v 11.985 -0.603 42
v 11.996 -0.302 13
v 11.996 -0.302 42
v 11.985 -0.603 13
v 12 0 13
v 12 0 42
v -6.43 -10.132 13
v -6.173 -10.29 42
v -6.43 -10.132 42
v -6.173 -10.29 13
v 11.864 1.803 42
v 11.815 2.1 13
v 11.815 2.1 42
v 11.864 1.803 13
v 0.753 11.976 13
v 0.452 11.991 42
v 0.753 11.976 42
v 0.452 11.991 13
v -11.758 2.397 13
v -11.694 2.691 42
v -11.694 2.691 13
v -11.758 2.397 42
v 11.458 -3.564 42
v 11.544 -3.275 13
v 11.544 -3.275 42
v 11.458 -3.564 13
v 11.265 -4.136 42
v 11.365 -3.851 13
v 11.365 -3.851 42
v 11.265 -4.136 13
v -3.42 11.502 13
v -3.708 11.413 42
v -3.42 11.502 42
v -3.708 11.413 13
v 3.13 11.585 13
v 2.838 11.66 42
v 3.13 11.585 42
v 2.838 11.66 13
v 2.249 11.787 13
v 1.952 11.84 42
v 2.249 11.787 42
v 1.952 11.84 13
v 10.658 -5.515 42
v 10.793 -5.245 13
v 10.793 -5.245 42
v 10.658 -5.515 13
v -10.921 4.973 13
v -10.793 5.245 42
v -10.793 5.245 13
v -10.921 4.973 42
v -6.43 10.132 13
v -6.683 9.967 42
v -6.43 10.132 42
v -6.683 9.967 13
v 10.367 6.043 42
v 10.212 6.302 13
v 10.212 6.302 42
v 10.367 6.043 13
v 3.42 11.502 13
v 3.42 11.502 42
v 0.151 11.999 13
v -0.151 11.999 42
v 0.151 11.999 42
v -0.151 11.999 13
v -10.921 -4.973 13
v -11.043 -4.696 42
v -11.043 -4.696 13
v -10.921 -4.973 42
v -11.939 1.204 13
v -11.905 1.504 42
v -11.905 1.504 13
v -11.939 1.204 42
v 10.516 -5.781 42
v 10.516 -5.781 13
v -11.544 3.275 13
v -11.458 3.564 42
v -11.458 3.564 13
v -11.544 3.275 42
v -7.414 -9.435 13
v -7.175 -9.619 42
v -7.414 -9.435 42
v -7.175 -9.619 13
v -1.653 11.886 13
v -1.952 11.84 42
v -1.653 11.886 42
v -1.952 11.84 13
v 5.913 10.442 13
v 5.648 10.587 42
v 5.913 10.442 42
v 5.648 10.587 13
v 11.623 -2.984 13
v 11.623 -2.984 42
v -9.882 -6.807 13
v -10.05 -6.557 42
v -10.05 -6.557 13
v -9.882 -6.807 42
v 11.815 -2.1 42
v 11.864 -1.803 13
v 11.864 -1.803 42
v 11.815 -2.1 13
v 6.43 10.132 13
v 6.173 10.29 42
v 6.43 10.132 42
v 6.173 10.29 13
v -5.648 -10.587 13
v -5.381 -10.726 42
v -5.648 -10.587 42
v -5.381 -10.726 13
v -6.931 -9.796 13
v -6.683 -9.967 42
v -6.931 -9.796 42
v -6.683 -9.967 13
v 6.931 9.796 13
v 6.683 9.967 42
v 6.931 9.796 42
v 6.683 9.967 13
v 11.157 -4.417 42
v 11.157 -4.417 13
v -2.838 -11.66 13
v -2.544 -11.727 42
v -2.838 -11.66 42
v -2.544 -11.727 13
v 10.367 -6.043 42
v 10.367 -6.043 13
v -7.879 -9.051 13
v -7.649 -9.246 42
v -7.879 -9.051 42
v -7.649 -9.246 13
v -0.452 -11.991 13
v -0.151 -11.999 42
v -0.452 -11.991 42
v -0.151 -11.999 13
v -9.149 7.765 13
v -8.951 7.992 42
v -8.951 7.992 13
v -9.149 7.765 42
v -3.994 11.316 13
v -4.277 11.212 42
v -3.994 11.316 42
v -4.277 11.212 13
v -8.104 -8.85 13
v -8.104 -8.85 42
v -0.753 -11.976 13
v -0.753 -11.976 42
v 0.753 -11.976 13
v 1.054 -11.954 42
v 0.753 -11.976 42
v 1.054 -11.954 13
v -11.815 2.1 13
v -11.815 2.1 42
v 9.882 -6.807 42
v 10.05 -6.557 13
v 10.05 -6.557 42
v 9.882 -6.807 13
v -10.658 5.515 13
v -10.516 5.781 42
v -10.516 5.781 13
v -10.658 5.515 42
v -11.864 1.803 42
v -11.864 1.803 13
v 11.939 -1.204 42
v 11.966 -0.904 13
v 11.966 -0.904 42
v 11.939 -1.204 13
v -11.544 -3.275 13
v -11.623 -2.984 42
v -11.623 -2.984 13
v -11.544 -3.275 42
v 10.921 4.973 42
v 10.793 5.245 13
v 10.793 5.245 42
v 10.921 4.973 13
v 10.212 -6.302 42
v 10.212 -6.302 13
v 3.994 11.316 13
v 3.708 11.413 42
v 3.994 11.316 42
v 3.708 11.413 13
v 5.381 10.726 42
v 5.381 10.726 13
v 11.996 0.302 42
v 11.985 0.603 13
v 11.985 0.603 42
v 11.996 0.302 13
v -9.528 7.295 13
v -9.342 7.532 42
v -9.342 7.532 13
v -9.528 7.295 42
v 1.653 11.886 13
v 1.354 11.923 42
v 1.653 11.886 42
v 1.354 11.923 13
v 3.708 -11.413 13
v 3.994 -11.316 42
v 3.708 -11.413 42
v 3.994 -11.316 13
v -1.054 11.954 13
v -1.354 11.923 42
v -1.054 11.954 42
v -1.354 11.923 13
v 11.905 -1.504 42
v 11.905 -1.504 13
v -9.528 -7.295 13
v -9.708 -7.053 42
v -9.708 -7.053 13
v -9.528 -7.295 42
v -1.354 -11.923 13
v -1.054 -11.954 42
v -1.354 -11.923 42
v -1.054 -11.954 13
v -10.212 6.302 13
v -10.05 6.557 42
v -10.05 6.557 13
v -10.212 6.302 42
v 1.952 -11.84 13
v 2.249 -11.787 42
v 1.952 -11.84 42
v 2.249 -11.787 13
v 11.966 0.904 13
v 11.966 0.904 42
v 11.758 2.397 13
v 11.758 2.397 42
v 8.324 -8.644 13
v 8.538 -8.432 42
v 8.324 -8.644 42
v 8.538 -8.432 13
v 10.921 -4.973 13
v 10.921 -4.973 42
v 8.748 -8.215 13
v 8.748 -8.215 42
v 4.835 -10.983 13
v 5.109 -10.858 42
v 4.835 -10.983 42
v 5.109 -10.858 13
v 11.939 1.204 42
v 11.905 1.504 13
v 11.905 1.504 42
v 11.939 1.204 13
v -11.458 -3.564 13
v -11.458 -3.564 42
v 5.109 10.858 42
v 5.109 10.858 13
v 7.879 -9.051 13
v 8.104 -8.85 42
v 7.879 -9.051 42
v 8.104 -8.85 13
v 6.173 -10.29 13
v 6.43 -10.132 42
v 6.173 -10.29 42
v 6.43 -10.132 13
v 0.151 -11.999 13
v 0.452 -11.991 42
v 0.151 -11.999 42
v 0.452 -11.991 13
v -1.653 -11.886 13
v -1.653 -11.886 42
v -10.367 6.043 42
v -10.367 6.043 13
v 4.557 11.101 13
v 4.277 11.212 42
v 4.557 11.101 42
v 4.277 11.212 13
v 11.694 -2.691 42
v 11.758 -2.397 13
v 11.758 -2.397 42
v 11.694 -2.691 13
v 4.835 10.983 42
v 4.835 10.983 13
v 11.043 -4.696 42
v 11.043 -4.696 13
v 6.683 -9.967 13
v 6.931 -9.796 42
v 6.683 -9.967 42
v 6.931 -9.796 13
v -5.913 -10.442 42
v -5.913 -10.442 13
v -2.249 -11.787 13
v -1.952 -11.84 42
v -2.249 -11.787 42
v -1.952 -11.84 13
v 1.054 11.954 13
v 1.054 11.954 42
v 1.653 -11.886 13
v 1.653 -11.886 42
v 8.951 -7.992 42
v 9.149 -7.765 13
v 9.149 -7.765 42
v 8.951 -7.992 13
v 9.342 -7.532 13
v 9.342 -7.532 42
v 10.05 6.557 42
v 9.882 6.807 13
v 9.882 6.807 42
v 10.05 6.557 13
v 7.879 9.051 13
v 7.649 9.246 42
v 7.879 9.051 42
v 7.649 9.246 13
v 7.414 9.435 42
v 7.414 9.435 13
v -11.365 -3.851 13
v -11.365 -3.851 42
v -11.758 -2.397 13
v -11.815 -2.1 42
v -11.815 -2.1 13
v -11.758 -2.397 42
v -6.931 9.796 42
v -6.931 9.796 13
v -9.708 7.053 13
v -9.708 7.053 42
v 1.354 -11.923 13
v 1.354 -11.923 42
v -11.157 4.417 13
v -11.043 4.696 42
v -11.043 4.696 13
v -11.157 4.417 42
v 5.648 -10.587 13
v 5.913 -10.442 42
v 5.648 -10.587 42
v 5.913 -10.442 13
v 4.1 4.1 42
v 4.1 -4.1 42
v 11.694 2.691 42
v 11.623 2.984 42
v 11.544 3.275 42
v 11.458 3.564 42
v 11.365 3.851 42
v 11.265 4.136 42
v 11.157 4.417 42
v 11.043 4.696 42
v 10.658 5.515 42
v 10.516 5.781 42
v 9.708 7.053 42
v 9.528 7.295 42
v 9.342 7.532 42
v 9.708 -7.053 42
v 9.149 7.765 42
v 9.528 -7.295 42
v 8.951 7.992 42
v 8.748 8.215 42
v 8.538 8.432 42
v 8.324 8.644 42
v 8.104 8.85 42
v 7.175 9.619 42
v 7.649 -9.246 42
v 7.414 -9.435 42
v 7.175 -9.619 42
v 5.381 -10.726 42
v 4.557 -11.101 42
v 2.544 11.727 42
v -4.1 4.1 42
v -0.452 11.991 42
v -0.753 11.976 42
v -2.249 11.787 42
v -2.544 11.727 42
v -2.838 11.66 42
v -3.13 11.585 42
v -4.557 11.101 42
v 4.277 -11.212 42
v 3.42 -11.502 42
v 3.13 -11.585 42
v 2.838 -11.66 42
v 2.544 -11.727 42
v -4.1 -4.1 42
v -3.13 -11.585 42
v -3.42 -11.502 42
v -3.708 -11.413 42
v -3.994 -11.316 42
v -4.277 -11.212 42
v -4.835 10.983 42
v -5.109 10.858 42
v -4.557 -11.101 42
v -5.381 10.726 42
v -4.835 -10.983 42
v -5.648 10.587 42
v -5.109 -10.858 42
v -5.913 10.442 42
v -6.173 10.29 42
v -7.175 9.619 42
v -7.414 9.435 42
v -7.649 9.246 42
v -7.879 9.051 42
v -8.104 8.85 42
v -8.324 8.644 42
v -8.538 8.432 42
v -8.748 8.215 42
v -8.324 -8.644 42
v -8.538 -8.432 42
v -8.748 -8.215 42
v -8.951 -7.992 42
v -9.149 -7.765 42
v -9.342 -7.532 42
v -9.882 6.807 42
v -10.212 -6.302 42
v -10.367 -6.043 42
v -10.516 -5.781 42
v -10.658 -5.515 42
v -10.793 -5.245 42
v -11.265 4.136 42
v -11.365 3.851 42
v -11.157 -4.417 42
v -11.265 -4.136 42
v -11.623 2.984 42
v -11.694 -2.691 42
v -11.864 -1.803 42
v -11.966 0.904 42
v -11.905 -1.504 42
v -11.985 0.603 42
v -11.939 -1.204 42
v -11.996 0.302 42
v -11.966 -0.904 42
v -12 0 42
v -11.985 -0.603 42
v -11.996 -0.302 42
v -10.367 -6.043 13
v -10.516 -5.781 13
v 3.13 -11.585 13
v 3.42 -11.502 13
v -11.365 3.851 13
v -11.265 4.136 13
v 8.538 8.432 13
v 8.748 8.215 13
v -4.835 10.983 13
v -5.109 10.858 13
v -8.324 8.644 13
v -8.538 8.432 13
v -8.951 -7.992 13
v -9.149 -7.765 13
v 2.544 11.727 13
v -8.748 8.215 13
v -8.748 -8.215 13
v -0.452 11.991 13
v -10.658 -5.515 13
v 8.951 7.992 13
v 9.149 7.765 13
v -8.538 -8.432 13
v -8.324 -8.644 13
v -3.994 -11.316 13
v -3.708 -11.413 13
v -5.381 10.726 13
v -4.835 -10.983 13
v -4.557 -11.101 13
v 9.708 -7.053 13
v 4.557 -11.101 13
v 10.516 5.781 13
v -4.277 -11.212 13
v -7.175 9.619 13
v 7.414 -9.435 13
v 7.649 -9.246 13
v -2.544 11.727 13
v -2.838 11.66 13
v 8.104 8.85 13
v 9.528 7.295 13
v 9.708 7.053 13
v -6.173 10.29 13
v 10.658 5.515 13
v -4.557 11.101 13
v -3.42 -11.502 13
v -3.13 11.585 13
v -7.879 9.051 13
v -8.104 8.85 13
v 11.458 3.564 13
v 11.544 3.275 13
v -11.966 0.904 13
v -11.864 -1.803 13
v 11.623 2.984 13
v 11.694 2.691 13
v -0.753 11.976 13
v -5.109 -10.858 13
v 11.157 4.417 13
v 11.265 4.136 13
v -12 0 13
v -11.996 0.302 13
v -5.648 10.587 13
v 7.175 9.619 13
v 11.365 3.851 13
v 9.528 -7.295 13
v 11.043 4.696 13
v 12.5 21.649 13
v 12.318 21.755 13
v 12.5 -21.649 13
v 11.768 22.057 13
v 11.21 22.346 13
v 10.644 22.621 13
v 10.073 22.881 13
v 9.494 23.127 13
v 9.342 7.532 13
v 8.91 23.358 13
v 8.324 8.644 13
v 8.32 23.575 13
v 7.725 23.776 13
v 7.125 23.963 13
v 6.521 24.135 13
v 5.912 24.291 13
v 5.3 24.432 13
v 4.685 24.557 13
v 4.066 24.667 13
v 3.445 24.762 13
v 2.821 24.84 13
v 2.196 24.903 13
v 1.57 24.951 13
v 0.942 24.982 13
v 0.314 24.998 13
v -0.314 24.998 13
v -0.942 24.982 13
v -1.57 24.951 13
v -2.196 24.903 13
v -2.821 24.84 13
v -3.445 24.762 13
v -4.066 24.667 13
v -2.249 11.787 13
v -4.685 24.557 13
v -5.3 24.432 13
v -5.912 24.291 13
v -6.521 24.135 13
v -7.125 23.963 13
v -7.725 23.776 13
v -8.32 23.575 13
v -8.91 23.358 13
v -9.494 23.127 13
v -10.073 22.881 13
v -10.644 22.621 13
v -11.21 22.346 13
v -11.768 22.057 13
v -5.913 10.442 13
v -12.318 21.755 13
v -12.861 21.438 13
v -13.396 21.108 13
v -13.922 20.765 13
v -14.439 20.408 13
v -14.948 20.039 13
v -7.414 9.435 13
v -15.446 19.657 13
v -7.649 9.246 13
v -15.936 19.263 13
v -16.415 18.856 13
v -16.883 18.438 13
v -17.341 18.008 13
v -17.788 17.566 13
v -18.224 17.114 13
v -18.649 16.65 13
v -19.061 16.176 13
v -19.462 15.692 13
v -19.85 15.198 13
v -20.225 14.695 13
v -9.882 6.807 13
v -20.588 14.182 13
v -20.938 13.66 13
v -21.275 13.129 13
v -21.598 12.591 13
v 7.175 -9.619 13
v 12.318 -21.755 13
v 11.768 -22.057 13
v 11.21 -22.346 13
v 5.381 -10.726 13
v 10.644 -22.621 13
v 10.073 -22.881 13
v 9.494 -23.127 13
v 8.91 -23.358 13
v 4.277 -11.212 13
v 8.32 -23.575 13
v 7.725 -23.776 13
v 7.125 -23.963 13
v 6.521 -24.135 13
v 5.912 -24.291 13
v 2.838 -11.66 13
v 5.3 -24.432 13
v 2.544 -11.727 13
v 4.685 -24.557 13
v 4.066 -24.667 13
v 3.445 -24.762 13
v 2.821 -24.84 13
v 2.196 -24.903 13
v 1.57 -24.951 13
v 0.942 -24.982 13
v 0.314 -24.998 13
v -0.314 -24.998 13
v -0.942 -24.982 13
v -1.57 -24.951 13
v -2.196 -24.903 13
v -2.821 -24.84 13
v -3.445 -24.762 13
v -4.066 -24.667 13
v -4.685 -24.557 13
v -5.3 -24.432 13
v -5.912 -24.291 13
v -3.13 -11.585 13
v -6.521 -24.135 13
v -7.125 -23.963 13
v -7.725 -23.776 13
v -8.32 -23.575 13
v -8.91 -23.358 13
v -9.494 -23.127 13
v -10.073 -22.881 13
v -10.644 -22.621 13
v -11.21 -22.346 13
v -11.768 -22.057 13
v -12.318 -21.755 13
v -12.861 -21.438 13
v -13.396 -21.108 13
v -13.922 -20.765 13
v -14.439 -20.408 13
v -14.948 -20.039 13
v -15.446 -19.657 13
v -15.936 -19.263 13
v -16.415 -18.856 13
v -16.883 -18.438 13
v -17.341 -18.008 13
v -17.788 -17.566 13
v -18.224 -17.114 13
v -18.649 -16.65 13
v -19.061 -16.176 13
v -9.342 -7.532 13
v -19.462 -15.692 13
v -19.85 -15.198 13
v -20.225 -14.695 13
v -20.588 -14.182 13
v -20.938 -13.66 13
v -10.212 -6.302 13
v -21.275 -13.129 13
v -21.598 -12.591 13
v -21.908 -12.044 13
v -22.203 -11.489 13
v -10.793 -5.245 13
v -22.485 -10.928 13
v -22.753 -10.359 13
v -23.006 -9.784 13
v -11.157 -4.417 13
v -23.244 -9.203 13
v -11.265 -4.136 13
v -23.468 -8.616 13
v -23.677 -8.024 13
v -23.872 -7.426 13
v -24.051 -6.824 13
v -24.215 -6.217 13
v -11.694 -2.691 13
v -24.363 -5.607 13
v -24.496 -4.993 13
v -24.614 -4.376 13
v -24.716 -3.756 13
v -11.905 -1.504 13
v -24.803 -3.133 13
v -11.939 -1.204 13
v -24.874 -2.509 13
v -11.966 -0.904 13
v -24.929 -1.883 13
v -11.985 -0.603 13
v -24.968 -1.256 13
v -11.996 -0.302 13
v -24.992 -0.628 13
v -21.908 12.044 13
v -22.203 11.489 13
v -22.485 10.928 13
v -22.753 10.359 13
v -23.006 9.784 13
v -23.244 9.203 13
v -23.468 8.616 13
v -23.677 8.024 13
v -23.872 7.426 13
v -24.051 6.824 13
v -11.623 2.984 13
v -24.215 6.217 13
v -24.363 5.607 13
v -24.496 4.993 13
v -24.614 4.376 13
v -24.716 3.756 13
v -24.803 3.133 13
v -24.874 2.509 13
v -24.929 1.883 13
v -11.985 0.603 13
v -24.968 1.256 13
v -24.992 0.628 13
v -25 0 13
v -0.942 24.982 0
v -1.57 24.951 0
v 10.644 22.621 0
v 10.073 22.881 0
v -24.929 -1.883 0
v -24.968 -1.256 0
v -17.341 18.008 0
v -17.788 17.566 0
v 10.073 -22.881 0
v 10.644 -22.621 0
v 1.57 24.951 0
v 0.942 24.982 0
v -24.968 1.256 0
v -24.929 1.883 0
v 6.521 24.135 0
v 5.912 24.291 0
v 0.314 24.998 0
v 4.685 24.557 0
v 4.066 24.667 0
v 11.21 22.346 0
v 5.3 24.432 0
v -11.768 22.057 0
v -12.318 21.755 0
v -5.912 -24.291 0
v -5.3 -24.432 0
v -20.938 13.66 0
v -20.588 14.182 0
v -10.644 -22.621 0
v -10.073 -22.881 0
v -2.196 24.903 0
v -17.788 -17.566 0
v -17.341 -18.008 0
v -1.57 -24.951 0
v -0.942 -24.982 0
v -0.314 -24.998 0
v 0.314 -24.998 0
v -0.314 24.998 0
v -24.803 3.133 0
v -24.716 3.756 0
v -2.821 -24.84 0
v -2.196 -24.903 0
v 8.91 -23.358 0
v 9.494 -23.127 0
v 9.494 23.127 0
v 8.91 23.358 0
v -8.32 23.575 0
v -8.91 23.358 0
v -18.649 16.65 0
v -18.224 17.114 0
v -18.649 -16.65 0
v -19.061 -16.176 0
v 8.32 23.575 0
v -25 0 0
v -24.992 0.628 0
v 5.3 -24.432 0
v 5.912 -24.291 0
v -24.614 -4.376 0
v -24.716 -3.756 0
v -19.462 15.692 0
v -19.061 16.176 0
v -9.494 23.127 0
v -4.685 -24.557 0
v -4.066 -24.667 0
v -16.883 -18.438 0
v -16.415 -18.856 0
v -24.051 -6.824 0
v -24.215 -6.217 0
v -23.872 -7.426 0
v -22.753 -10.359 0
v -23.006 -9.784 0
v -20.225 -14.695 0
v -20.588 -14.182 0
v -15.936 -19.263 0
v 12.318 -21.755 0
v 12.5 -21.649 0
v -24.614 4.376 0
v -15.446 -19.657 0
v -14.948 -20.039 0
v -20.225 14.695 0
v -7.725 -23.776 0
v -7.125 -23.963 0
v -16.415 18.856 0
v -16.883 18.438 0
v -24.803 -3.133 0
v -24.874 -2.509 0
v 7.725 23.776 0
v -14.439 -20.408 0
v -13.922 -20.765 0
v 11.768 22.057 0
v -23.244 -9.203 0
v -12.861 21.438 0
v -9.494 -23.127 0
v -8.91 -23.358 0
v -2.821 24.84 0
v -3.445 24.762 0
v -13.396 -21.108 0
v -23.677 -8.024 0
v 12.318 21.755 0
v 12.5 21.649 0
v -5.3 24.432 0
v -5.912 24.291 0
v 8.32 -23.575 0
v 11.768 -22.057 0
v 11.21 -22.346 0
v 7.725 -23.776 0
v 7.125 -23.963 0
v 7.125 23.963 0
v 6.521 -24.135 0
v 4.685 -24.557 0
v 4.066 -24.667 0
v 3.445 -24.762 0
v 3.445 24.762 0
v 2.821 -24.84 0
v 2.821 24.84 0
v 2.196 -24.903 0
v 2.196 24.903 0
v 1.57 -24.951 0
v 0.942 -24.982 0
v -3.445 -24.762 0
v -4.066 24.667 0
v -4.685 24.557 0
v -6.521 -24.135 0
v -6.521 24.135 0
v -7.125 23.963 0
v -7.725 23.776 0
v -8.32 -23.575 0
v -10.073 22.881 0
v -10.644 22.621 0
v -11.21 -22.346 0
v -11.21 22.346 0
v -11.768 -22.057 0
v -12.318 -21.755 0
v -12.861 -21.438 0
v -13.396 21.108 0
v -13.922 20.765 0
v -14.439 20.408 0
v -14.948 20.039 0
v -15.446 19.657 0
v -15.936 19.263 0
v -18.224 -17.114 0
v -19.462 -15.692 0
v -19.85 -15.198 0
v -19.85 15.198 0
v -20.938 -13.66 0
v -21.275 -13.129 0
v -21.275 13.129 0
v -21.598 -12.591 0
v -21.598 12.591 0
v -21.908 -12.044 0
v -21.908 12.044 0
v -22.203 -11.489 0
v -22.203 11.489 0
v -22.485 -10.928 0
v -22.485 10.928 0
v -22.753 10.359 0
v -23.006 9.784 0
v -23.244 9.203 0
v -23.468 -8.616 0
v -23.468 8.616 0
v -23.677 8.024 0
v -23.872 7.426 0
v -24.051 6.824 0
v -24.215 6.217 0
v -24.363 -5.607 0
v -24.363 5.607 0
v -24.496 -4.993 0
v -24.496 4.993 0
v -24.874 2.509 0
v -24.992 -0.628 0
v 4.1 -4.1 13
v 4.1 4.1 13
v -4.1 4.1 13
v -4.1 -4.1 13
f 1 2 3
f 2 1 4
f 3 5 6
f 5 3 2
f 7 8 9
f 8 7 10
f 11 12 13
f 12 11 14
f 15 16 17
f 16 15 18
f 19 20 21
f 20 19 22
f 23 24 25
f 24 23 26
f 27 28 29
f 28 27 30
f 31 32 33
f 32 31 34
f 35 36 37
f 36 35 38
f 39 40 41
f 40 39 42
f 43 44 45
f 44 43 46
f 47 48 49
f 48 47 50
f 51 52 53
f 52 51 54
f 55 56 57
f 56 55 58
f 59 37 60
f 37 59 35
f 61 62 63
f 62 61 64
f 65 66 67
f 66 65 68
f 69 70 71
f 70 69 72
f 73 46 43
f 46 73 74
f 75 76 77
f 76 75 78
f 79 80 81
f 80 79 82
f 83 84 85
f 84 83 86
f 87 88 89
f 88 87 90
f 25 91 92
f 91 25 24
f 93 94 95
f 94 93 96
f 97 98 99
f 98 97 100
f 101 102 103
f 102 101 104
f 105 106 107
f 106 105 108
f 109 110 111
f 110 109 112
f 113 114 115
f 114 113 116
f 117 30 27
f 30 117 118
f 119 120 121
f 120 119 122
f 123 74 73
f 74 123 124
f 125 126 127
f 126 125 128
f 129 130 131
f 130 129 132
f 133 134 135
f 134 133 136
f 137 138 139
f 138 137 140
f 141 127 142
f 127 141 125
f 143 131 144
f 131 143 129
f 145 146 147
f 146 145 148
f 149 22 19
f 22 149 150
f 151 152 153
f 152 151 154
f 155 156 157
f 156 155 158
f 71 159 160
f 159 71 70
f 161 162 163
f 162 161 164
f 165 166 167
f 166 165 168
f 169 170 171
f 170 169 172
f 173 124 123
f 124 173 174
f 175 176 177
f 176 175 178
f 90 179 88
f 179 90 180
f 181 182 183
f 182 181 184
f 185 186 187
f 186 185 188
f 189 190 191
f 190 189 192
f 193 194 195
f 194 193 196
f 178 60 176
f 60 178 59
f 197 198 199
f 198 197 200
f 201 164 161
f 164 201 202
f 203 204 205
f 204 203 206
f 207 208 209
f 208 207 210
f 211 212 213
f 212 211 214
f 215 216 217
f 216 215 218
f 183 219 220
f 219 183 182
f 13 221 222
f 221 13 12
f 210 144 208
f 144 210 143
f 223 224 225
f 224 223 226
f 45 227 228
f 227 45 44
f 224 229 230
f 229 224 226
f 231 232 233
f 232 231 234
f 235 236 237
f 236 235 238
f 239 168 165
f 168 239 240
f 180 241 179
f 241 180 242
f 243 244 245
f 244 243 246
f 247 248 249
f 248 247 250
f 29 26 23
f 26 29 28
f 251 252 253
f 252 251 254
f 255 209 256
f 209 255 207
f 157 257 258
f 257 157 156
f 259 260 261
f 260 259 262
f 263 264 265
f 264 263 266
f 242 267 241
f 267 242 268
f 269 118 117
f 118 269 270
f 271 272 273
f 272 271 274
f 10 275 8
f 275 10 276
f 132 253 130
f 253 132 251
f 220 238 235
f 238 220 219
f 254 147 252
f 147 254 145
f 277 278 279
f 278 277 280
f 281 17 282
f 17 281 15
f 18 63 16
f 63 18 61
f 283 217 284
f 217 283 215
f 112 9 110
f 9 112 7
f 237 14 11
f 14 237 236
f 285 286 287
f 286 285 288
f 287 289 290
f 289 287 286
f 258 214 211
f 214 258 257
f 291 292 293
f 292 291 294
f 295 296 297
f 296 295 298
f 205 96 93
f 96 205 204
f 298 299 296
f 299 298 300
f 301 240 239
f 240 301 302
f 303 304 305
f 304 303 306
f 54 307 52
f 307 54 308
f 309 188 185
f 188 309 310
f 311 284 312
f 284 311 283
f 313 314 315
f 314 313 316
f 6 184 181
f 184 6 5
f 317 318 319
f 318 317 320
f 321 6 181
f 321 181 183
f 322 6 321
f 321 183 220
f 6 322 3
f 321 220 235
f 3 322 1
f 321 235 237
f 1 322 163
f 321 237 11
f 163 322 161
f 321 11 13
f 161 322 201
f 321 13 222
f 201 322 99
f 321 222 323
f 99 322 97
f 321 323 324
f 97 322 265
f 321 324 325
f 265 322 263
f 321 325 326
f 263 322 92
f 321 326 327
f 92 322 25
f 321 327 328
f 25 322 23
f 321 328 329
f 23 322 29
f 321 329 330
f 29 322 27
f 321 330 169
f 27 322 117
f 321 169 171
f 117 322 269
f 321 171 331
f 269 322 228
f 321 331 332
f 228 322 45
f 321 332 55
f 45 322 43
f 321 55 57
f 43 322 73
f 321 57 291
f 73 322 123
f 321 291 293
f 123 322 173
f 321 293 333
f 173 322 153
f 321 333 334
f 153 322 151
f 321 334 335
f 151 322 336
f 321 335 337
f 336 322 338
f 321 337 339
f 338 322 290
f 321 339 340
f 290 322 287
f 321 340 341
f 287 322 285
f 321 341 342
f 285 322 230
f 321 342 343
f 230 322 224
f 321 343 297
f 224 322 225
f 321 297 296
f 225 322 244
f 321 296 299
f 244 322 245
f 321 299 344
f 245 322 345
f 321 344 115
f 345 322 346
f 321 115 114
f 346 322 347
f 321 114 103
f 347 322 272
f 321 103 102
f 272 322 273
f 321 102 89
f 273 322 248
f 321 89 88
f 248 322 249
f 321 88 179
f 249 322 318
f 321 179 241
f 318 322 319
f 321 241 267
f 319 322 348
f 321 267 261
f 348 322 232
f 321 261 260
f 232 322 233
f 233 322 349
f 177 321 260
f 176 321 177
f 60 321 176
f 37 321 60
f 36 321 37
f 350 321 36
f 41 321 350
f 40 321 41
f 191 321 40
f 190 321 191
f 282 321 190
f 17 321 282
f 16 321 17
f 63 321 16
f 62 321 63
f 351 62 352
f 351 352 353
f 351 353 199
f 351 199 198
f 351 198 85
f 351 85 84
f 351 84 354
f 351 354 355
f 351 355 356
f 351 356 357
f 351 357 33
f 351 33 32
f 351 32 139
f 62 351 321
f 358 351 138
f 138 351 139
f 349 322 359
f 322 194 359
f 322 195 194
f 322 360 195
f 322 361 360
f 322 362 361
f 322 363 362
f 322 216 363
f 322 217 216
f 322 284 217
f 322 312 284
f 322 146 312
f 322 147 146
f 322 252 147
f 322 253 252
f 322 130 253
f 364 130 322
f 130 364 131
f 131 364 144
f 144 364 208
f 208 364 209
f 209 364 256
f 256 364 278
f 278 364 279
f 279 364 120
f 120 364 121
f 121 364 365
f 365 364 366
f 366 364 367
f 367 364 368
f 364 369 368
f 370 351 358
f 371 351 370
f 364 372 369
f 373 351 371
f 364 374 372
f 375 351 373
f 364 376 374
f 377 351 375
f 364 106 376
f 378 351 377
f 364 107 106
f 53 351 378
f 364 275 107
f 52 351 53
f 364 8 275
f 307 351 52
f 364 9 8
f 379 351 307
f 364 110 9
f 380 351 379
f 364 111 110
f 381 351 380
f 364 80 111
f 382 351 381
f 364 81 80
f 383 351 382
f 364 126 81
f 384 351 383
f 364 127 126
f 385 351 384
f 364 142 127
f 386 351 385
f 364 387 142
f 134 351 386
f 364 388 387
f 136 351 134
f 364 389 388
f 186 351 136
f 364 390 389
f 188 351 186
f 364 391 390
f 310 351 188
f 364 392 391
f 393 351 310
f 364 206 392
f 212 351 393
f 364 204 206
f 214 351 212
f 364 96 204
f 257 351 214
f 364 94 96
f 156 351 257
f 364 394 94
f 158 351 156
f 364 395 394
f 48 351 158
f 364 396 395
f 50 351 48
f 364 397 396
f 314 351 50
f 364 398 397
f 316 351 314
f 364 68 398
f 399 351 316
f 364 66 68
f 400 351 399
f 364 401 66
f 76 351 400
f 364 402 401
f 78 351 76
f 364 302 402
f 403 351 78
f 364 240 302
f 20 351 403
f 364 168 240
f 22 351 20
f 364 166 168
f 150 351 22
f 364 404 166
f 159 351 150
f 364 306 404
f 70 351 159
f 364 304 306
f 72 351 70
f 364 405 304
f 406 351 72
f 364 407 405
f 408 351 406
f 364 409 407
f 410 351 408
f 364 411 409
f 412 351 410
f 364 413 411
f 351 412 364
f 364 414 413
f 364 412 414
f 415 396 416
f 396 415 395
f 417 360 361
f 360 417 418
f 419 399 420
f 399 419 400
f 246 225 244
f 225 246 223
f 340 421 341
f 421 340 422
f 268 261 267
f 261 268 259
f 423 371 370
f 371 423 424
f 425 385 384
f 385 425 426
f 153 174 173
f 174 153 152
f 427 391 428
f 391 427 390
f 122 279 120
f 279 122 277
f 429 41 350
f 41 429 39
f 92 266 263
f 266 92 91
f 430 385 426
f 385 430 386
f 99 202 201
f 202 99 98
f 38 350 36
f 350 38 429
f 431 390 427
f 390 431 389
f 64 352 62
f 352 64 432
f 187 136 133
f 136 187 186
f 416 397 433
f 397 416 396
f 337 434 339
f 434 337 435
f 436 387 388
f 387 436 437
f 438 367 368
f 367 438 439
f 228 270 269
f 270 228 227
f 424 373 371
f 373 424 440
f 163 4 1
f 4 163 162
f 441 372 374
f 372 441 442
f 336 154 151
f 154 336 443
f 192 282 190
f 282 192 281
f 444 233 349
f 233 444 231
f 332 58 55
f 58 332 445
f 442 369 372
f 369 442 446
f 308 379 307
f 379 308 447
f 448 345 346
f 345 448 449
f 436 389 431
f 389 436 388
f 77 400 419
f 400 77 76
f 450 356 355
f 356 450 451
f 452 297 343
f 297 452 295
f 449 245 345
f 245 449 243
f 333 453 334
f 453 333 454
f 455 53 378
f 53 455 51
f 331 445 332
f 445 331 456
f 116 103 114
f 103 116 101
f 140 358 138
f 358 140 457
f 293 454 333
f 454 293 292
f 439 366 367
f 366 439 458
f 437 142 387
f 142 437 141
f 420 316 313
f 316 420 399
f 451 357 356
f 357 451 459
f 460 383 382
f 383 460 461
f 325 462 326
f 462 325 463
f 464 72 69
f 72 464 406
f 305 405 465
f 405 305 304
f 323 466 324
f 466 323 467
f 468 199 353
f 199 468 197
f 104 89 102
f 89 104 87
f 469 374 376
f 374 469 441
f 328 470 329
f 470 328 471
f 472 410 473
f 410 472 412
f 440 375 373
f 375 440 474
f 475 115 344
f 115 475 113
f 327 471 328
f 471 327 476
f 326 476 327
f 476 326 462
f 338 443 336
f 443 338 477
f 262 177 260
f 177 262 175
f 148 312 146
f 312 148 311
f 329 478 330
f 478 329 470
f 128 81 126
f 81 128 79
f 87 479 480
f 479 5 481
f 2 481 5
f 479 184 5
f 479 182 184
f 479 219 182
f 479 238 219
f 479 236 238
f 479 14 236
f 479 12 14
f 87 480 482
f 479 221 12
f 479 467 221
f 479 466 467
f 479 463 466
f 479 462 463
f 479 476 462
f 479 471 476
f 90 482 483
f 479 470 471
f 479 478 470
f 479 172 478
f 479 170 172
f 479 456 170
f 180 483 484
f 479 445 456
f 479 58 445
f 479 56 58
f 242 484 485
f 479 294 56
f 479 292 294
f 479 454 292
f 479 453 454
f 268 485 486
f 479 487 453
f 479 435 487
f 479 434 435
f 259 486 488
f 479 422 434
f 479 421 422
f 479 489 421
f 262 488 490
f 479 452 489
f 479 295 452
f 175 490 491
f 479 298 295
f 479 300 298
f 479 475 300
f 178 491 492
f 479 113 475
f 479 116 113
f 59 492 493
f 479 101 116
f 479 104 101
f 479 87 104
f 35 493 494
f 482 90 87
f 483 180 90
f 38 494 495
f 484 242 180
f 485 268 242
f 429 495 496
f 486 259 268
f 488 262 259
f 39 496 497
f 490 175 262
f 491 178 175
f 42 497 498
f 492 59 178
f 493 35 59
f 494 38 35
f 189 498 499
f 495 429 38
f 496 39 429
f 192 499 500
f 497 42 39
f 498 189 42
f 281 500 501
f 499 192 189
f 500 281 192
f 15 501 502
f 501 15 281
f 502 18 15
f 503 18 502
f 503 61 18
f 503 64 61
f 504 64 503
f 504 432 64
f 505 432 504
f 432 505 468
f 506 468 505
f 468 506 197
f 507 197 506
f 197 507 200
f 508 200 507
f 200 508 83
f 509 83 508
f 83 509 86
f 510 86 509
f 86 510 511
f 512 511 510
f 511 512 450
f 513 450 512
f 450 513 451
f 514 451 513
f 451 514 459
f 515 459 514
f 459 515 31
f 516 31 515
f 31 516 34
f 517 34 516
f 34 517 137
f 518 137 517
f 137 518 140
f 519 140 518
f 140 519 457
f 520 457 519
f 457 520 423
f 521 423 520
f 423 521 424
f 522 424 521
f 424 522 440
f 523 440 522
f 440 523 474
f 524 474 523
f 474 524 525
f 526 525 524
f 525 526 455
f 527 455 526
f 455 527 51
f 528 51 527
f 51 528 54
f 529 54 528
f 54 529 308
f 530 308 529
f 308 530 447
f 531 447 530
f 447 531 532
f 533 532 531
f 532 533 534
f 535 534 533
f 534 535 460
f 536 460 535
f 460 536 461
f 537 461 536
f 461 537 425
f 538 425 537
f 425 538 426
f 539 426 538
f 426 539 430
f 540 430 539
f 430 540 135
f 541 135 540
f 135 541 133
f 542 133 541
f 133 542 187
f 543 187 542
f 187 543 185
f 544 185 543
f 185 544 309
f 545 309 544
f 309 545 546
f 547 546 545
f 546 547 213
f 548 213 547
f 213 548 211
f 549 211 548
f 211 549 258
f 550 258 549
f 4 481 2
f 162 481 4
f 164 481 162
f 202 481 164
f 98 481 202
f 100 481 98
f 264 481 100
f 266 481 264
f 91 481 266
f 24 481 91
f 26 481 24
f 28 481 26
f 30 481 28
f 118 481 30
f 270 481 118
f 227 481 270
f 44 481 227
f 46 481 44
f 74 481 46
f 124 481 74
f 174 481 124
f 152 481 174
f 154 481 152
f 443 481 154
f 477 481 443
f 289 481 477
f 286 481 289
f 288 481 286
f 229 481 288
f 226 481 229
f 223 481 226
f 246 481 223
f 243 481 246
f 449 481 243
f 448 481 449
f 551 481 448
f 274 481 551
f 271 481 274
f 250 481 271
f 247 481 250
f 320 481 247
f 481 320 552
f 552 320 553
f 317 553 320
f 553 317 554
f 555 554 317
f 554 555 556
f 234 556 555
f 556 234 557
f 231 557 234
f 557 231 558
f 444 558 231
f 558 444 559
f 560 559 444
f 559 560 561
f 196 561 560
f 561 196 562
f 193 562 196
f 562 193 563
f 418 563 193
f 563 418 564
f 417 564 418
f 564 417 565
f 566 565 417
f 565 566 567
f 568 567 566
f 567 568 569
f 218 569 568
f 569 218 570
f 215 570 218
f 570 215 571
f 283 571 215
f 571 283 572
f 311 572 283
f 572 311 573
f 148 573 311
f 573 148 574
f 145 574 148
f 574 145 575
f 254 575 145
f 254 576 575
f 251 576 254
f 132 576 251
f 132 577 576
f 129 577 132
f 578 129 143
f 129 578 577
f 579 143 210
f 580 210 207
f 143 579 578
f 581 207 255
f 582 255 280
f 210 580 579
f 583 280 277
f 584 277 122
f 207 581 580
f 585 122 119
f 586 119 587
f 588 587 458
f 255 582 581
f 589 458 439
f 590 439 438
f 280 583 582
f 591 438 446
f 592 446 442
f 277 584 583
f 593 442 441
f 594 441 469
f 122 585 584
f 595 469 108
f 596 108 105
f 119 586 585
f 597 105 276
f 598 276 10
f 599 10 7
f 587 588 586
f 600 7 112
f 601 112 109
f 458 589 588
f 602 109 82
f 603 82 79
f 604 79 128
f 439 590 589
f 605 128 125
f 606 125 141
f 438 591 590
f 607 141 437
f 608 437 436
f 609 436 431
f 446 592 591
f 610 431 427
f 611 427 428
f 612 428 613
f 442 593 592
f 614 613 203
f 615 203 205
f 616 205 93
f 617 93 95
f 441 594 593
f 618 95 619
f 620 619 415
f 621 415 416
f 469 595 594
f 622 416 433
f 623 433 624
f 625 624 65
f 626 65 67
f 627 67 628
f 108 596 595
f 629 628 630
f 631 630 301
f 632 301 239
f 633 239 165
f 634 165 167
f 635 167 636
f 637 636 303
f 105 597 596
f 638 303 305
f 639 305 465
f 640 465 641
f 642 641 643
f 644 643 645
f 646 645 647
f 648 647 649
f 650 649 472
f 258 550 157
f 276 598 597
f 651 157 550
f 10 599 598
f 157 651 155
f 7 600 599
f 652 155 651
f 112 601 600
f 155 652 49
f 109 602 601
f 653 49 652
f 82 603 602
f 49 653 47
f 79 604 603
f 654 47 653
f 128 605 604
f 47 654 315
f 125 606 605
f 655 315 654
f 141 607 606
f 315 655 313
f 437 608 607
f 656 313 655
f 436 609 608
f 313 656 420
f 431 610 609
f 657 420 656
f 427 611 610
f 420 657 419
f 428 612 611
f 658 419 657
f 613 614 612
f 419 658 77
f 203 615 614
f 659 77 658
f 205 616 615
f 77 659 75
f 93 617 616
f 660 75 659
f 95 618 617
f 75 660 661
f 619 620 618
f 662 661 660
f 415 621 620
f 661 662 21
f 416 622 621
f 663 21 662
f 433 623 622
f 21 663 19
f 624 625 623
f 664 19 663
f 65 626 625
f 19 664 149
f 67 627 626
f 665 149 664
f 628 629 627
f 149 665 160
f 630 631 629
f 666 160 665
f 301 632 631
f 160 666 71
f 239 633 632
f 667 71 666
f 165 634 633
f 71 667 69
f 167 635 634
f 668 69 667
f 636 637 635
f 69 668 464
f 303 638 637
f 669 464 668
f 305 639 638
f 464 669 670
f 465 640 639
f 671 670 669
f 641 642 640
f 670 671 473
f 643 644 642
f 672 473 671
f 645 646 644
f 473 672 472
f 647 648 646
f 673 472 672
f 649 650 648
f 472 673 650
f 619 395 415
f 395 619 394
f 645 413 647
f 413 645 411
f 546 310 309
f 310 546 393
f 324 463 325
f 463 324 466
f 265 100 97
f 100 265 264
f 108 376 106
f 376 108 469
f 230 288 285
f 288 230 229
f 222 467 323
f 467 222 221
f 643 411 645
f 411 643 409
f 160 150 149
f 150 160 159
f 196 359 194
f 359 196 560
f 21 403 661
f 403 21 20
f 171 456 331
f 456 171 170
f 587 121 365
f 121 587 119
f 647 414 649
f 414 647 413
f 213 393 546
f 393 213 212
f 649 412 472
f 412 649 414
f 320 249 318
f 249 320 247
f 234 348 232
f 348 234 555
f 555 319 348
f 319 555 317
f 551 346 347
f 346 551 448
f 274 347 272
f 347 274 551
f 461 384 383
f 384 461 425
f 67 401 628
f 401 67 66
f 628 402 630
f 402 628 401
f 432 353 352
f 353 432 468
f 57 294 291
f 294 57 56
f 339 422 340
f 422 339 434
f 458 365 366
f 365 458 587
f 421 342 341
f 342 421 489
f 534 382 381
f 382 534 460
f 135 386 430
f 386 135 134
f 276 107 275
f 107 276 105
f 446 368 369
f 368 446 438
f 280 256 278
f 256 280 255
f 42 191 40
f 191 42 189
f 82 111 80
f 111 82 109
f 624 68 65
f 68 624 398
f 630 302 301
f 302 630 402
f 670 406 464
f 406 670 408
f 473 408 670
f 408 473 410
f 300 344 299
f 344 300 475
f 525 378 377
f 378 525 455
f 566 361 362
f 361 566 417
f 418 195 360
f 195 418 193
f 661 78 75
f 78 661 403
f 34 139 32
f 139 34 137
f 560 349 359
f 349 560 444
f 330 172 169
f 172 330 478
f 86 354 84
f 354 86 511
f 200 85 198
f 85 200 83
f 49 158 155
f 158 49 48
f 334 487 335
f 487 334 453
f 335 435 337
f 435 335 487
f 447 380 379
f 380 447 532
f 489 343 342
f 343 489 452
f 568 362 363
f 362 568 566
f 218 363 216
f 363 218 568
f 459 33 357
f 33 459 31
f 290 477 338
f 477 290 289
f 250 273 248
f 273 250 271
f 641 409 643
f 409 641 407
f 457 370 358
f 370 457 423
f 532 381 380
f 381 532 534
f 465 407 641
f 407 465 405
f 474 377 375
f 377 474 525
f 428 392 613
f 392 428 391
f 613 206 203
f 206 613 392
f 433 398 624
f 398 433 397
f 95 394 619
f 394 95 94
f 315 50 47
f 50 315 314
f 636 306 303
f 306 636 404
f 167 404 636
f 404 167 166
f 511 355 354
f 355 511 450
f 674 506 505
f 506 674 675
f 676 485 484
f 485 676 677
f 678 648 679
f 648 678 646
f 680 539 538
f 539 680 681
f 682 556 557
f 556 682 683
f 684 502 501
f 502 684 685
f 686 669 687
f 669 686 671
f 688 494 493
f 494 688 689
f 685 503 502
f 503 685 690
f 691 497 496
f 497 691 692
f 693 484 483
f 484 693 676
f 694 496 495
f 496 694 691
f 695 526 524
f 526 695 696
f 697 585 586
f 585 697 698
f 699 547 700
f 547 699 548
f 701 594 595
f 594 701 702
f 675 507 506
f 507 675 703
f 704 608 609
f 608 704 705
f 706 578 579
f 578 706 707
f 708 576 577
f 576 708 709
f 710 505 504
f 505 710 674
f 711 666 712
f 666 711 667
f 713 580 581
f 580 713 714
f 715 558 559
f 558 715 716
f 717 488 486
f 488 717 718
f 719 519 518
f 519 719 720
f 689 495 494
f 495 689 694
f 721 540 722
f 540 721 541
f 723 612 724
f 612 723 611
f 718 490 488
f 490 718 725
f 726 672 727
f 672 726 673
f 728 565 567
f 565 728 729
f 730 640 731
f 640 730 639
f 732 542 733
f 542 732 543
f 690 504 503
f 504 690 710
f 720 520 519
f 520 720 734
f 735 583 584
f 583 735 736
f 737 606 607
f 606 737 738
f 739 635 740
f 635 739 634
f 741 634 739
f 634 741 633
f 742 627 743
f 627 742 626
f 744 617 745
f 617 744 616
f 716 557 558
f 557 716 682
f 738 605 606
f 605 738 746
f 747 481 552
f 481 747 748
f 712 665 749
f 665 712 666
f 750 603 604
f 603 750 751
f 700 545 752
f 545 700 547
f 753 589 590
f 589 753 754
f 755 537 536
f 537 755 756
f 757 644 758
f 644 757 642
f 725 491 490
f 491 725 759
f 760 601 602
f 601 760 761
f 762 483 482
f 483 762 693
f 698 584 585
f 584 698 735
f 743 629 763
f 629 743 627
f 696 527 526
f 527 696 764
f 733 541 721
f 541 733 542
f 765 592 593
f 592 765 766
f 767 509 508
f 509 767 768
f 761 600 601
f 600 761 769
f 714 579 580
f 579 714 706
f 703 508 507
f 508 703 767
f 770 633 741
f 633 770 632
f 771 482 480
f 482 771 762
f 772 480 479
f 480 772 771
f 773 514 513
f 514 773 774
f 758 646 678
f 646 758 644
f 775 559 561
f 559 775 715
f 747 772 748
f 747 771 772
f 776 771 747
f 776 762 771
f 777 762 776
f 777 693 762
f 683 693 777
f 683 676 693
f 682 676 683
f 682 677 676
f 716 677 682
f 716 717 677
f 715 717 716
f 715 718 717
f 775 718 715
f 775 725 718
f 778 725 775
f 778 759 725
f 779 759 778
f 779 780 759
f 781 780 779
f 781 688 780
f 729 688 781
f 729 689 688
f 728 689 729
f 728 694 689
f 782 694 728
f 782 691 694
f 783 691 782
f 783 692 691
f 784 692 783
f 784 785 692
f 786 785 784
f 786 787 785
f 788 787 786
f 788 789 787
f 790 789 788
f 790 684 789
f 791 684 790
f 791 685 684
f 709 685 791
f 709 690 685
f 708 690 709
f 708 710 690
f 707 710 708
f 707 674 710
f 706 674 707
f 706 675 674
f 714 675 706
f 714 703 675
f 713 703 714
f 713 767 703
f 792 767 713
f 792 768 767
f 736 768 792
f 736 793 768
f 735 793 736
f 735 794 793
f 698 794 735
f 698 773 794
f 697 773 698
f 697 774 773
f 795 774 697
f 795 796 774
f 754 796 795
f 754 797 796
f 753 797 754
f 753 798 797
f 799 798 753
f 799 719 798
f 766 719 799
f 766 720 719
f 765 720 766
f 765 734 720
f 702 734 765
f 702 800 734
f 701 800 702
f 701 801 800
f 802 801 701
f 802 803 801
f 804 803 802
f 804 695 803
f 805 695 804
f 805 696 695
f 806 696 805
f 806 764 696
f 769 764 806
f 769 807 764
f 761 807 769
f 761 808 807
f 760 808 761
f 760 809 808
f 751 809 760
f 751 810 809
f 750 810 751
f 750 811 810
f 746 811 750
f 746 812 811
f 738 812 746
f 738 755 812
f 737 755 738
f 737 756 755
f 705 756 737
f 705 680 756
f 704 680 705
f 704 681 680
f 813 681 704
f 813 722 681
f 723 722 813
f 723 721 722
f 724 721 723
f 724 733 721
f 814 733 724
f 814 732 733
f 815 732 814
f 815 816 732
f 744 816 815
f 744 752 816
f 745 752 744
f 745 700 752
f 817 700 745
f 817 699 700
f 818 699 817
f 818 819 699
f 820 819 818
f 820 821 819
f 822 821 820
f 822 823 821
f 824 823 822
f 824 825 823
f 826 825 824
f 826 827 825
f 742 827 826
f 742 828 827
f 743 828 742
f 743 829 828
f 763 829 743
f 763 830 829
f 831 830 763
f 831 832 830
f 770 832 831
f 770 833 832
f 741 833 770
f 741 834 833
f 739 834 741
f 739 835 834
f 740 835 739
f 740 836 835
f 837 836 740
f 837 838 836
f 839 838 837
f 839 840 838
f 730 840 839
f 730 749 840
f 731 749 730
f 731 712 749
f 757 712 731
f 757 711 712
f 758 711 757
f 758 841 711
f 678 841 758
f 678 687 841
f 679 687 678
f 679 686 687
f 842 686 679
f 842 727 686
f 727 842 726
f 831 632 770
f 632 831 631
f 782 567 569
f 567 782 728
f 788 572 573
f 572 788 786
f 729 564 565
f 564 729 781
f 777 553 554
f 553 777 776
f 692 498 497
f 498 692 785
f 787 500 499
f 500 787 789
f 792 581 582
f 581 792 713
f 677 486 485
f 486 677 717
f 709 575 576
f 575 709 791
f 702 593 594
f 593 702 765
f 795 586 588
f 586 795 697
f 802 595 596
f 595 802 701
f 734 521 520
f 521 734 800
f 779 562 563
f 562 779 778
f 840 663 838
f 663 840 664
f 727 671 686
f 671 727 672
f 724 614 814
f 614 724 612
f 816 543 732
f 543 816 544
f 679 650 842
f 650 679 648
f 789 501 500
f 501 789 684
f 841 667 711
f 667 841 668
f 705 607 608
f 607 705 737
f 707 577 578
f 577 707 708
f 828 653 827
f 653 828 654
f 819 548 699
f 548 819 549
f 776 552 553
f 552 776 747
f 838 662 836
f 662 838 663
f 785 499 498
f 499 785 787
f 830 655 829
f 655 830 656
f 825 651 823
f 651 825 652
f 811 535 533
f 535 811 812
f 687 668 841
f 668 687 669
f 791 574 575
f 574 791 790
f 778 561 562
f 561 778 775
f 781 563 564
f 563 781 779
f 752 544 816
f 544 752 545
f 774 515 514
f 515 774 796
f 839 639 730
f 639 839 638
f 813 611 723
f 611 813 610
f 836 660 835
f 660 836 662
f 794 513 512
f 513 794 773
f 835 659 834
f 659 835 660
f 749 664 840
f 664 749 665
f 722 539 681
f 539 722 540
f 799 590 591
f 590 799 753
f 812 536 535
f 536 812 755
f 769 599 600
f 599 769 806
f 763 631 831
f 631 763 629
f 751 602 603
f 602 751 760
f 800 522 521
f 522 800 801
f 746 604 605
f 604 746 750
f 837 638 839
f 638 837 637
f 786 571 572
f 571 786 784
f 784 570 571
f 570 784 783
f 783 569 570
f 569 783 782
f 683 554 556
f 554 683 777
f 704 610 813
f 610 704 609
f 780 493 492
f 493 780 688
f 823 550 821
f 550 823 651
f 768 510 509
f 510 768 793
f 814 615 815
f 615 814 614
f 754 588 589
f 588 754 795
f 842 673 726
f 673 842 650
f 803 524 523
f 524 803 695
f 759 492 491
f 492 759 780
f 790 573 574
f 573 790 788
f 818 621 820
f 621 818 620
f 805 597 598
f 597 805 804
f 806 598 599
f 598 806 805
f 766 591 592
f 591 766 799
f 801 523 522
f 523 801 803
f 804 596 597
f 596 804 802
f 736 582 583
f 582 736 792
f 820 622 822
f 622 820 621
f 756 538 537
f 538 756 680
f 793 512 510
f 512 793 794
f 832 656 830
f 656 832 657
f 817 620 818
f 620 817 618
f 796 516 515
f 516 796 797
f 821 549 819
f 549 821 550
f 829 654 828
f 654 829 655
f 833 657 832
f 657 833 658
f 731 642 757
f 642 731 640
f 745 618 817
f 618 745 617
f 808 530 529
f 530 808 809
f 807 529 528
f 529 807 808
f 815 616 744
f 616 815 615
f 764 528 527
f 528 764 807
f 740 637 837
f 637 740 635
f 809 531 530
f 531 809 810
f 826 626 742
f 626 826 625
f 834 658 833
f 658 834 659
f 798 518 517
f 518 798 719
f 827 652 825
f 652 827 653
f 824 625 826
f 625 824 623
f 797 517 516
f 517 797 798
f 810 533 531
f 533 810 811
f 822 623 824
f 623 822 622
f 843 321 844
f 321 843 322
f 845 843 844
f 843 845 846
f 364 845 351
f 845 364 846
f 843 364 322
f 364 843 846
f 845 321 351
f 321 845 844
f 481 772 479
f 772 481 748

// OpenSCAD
$fn = 250;

STEM_HEIGHT = 29;
STEM_RADIUS = 12;
CAP_HEIGHT = 13;
CAP_RADIUS = 25;

HOLE_SIDE_LENGTH = 8.2;

render() {
  translate(v = [ 0, 0, STEM_HEIGHT + CAP_HEIGHT ]) {  // Move up from below the 0 line
    rotate([ 180, 0, 0 ]) {                            // rotate on its head for easy printing
      difference() {
        difference() {
          union() {
            cylinder(h = STEM_HEIGHT, r = STEM_RADIUS);  // Stem
            translate(v = [ 0, 0, STEM_HEIGHT ]) {       // above Stem
              cylinder(h = CAP_HEIGHT, r = CAP_RADIUS);  // Cap
            }
          }
          translate(v = [ 0, 0, STEM_HEIGHT / 2 ]) {
            cube(size = [ HOLE_SIDE_LENGTH, HOLE_SIDE_LENGTH, STEM_HEIGHT ], center = true);  // this makes the 4 sided hole
          }
        }
        translate(v = [ CAP_RADIUS, 0, STEM_HEIGHT + (CAP_HEIGHT / 2) ]) {         // Move cutoff cube up to where it needs to be
          cube(size = [ CAP_RADIUS, CAP_RADIUS * 2, CAP_HEIGHT ], center = true);  // This cuts the cap off at one side
        }
      }
    }
  }
}
